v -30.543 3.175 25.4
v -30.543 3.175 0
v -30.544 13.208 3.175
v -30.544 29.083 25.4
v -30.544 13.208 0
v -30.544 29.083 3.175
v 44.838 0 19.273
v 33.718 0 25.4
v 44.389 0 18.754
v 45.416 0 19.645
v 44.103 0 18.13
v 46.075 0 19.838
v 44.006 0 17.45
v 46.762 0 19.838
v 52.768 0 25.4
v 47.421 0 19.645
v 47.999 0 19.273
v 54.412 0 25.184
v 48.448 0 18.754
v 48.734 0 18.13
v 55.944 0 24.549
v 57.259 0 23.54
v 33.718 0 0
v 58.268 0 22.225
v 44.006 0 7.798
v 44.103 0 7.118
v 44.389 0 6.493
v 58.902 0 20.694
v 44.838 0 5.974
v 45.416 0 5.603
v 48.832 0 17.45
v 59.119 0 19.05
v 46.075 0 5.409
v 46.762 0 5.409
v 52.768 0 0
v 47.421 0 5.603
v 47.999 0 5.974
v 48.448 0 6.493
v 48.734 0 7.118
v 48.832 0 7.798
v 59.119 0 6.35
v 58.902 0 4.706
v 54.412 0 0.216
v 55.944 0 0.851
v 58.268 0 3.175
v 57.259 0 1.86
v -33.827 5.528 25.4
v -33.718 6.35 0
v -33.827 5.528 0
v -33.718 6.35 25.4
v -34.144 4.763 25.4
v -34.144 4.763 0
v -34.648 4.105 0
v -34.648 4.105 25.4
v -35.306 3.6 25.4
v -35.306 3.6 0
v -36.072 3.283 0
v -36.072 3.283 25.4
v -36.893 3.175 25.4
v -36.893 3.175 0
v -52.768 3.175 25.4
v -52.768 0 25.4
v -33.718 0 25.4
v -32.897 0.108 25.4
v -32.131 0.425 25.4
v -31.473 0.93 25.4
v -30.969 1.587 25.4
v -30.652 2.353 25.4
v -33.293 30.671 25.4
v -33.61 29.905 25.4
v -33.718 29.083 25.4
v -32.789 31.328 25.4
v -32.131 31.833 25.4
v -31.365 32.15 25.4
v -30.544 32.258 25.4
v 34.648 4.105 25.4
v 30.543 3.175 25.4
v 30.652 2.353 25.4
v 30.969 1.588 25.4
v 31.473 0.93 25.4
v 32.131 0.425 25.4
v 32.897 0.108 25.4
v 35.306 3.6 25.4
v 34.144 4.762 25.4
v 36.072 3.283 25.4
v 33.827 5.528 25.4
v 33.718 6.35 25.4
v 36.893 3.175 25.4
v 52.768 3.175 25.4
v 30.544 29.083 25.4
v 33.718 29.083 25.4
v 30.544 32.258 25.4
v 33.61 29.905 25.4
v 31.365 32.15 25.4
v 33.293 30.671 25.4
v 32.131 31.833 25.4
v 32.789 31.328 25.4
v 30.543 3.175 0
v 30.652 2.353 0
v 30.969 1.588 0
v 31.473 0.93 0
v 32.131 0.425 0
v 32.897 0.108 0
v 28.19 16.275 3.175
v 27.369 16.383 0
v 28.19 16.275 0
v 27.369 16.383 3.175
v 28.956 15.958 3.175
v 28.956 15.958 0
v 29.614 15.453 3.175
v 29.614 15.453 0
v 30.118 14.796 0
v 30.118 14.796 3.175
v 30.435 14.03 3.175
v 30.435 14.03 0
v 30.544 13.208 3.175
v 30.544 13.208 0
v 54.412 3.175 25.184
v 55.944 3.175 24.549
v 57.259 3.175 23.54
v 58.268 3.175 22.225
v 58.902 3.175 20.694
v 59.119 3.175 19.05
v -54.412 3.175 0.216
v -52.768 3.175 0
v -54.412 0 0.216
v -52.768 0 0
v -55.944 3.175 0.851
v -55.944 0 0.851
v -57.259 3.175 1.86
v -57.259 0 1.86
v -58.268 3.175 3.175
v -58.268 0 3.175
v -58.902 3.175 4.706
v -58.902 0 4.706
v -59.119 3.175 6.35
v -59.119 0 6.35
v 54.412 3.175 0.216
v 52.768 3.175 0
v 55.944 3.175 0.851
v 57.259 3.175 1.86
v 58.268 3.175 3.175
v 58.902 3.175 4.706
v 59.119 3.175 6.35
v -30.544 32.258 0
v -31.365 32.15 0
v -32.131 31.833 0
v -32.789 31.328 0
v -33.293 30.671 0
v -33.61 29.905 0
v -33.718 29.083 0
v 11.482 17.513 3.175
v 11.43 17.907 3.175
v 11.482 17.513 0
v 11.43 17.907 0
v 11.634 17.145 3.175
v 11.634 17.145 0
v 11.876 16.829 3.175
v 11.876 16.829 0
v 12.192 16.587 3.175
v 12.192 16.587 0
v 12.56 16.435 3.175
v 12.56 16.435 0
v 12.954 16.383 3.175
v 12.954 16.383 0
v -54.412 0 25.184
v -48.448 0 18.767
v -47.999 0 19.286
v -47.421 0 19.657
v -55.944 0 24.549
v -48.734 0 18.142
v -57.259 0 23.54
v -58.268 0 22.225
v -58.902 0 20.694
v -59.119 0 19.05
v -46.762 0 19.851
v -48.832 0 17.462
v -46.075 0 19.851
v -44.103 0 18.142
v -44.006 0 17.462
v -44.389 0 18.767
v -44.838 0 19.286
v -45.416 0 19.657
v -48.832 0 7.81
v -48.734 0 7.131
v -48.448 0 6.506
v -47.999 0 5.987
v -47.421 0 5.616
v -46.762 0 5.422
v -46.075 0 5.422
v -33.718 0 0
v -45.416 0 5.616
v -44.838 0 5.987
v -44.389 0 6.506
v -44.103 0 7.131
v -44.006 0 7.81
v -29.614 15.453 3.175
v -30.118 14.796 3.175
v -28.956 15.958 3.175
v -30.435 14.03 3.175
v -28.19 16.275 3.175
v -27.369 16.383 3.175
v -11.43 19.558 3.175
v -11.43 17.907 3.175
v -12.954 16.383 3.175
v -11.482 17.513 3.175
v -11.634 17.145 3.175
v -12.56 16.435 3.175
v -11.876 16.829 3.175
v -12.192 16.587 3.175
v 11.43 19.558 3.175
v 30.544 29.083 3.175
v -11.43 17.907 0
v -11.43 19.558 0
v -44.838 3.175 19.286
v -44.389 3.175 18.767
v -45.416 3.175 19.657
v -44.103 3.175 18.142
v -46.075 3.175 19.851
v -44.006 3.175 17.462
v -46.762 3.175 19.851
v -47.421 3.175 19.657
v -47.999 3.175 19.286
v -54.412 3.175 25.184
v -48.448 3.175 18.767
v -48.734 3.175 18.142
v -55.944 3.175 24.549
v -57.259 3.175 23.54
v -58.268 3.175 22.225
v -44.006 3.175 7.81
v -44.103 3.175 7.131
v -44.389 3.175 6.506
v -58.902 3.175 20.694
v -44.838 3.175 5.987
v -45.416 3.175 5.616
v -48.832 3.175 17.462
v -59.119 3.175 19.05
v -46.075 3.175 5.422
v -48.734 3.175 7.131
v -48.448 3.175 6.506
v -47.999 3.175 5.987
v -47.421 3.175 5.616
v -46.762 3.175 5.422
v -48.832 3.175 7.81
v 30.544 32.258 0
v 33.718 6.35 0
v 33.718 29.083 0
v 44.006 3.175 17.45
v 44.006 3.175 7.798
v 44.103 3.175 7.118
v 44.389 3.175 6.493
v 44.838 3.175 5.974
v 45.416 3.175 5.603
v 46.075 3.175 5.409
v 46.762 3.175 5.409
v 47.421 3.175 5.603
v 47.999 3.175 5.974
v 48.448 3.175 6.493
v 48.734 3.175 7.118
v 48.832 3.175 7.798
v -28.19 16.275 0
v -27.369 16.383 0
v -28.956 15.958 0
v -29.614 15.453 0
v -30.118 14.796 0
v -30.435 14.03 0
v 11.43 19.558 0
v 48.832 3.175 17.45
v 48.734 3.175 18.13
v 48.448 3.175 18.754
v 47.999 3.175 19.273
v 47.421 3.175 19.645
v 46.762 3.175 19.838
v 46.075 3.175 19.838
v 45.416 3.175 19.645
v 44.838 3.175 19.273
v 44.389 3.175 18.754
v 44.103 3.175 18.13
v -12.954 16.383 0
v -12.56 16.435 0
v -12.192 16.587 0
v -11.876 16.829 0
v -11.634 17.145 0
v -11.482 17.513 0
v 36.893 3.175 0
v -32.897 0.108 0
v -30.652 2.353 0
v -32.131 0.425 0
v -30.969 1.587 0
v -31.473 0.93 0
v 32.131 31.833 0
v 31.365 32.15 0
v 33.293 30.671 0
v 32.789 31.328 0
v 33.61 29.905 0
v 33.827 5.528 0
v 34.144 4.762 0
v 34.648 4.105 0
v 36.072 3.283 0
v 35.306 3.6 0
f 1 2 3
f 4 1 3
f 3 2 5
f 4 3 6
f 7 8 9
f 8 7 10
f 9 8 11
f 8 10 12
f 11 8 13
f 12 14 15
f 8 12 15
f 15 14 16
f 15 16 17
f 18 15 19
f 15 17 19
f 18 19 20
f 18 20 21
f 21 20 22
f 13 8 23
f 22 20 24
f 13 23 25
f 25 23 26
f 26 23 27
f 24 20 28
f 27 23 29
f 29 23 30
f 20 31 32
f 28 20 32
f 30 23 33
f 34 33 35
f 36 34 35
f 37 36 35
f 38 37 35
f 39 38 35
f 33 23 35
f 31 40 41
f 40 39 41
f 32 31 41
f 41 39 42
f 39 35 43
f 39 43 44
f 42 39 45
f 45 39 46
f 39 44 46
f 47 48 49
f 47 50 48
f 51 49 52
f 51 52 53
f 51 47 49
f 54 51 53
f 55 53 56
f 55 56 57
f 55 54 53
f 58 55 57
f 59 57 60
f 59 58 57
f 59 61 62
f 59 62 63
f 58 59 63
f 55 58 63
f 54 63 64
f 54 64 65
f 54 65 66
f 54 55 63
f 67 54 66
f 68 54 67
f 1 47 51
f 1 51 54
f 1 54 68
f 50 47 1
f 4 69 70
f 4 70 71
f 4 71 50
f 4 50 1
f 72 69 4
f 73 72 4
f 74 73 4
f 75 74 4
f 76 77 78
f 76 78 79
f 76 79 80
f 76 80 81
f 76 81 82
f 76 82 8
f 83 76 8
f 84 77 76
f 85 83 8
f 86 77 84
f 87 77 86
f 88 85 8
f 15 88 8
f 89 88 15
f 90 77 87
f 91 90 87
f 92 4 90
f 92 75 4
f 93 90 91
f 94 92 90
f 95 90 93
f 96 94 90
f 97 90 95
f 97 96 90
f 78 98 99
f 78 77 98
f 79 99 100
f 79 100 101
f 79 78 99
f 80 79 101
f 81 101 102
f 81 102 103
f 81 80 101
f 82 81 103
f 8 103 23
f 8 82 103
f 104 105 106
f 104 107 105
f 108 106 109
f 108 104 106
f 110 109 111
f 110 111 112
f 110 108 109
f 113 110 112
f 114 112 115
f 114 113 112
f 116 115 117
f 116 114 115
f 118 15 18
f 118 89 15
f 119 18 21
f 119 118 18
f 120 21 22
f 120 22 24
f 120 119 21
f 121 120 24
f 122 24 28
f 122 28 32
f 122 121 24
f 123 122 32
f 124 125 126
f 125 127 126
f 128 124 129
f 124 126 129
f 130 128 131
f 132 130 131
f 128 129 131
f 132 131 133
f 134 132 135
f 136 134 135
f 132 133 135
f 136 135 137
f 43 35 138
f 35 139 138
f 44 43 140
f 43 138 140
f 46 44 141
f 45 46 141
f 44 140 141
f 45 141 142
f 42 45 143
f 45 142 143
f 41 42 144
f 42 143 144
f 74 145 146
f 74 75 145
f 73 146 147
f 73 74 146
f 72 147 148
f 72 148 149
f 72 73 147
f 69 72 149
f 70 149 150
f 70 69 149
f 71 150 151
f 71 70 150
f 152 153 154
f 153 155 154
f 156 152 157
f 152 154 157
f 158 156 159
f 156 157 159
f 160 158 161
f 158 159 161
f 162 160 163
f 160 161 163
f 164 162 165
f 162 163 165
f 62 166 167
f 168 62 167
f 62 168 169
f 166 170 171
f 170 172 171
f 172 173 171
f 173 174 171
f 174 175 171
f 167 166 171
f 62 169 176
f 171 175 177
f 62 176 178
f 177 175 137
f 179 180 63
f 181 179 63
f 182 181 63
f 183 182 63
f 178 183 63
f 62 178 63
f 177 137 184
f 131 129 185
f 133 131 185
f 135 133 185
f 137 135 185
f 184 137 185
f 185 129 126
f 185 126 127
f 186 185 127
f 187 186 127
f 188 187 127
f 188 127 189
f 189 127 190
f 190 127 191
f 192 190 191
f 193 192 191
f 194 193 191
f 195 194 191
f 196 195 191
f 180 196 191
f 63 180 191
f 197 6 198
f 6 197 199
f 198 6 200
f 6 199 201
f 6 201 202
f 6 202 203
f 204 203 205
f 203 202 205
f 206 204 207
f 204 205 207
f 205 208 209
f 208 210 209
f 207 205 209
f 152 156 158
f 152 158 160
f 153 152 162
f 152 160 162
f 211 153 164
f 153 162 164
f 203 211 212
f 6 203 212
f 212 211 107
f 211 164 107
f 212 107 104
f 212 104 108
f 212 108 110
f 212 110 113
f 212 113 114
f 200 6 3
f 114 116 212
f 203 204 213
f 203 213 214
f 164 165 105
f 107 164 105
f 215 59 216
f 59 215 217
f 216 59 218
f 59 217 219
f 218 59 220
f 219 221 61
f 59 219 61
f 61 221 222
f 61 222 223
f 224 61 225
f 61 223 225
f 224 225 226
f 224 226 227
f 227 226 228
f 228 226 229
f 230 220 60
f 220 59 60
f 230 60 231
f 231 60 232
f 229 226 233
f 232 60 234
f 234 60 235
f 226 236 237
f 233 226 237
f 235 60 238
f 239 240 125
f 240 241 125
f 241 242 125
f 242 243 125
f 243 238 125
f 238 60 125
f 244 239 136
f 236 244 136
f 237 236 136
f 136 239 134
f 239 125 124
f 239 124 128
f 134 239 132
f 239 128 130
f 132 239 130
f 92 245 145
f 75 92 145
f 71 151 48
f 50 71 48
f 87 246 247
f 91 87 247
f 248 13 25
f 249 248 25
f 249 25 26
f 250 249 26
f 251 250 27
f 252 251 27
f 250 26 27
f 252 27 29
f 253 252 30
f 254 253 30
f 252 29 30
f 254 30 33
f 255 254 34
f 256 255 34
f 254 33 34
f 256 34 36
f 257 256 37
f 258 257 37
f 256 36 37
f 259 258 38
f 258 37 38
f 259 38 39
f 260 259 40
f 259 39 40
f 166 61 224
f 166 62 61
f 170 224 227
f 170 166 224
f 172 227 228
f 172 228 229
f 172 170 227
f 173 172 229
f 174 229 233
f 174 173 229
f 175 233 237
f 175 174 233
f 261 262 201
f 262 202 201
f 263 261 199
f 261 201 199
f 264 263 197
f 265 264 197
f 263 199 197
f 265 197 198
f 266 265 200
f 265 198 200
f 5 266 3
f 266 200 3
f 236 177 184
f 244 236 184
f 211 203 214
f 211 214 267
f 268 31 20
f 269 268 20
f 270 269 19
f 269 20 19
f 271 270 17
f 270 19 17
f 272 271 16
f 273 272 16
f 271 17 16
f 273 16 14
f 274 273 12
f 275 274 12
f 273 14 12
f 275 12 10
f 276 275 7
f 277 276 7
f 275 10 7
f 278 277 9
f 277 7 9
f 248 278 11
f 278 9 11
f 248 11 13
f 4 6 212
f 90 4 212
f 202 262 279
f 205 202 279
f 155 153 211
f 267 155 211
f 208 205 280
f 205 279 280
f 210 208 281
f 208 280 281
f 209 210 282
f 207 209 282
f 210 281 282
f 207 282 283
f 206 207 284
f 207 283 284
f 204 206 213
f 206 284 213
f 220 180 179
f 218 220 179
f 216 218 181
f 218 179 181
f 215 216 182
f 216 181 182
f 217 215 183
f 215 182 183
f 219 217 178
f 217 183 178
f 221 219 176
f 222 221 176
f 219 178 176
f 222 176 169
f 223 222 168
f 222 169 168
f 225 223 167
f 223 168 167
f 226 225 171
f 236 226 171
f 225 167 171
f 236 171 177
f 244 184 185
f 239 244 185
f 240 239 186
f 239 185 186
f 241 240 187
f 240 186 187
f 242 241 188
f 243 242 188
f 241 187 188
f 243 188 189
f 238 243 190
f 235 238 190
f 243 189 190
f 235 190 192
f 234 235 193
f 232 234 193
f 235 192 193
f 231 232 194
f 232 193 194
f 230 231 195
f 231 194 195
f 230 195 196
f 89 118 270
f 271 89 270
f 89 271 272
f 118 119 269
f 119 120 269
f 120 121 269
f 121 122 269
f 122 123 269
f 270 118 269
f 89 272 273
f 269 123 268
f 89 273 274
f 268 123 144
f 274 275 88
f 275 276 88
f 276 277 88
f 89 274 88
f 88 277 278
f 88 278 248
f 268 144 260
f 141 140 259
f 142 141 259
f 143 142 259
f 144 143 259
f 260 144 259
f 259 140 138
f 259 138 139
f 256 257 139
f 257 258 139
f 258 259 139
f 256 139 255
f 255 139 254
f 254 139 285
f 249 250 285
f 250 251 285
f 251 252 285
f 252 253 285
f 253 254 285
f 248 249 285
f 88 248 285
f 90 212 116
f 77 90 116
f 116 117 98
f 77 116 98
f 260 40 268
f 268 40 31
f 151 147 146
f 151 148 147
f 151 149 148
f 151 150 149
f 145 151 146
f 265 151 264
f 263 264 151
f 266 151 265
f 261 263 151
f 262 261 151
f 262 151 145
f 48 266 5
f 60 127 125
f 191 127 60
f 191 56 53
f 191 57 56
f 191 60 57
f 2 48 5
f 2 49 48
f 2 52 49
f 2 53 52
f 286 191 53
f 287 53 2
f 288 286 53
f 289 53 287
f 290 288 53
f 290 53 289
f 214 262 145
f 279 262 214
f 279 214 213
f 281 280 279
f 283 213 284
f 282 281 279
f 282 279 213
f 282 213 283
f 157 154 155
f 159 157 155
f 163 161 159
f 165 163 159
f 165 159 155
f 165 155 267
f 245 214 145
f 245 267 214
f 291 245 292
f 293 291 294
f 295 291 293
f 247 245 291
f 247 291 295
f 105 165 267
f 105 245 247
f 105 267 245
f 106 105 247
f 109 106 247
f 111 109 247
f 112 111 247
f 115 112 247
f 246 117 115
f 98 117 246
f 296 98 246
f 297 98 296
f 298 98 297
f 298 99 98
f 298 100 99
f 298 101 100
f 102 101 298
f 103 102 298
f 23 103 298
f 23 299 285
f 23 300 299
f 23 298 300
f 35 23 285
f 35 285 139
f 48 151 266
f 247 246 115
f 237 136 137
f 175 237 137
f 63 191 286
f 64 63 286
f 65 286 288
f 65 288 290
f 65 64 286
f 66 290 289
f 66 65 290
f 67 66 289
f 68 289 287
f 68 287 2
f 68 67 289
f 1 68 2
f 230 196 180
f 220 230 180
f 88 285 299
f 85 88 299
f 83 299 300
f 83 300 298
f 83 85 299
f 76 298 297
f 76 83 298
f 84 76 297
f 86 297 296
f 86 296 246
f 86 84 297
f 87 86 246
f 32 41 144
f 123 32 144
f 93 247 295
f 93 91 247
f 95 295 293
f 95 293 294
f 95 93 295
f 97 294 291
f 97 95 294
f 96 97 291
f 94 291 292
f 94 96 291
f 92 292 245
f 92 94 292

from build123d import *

# Parameters (mm, degrees)
F1_DEPTH  = 25.4
F2_R      = 3.175
F4_DEPTH  = 32.259
F5_R      = 6.35
F6_W      = 61.087
F6_H      = 12.7
F7_DEPTH  = 3.175
F8_R      = 3.175
F9_W      = 22.86
F9_H      = 3.175
F10_DEPTH = 25.4
F11_R     = 1.524


with BuildPart() as f1:
    # F0 (on Top) → F1 (new body)
    with BuildSketch(Plane.XY):
        Polygon((-30.5435, 29.083), (0, 29.083), (30.5435, 29.083), (30.5435, 0), (59.1185, 0), (59.1185, 3.175), (33.7185, 3.175), (33.7185, 32.258), (0, 32.258), (-33.7185, 32.258), (-33.7185, 3.175), (-59.1185, 3.175), (-59.1185, 0), (-30.5435, 0), align=None)
    extrude(amount=F1_DEPTH)

    # F2
    f2_edges = [f1.edges().sort_by_distance(p)[0] for p in [
        (-30.5435, 0, 12.7),
        (30.5435, 0, 12.7),
    ]]
    fillet(f2_edges, radius=F2_R)

    # F3 (on Front) → F4 (cut, through all)
    with BuildSketch(Plane.XZ):
        with BuildLine():
            ThreePointArc((-48.8315, 7.8105), (-46.4185, 5.3975), (-44.0055, 7.8105))
            Line((-44.0055, 7.8105), (-44.0055, 17.4625))
            ThreePointArc((-44.0055, 17.4625), (-46.4185, 19.8755), (-48.8315, 17.4625))
            Line((-48.8315, 17.4625), (-48.8315, 7.8105))
        make_face()
        with BuildLine():
            ThreePointArc((48.8315, 17.4498), (46.4185, 19.8628), (44.0055, 17.4498))
            Line((44.0055, 17.4498), (44.0055, 7.7978))
            ThreePointArc((44.0055, 7.7978), (46.4185, 5.3848), (48.8315, 7.7978))
            Line((48.8315, 7.7978), (48.8315, 17.4498))
        make_face()
    extrude(amount=-F4_DEPTH, mode=Mode.SUBTRACT)

    # F5
    f5_edges = [f1.edges().sort_by_distance(p)[0] for p in [
        (-59.1185, 1.5875, 0),
        (-59.1185, 1.5875, 25.4),
        (59.1185, 1.5875, 25.4),
        (59.1185, 1.5875, 0),
    ]]
    fillet(f5_edges, radius=F5_R)

    # F6 (on face) → F7 (join)
    with BuildSketch(Plane(origin=(0, 0, 0), x_dir=(1, 0, 0), z_dir=(0, 0, -1))):
        with Locations((0, -22.733)):
            Rectangle(F6_W, F6_H)
    extrude(amount=-F7_DEPTH)

    # F8
    f8_edges = [f1.edges().sort_by_distance(p)[0] for p in [
        (33.7185, 3.175, 12.7),
        (33.7185, 32.258, 12.7),
        (-33.7185, 32.258, 12.7),
        (-33.7185, 3.175, 12.7),
        (30.5435, 16.383, 1.5875),
        (-30.5435, 16.383, 1.5875),
    ]]
    fillet(f8_edges, radius=F8_R)

    # F9 (on face) → F10 (cut)
    with BuildSketch(Plane.XY.offset(3.175)):
        with Locations((0, 17.9705)):
            Rectangle(F9_W, F9_H)
    extrude(amount=-F10_DEPTH, mode=Mode.SUBTRACT)

    # F11
    f11_edges = [f1.edges().sort_by_distance(p)[0] for p in [
        (-11.43, 16.383, 1.5875),
        (11.43, 16.383, 1.5875),
    ]]
    fillet(f11_edges, radius=F11_R)


solid = f1.part
